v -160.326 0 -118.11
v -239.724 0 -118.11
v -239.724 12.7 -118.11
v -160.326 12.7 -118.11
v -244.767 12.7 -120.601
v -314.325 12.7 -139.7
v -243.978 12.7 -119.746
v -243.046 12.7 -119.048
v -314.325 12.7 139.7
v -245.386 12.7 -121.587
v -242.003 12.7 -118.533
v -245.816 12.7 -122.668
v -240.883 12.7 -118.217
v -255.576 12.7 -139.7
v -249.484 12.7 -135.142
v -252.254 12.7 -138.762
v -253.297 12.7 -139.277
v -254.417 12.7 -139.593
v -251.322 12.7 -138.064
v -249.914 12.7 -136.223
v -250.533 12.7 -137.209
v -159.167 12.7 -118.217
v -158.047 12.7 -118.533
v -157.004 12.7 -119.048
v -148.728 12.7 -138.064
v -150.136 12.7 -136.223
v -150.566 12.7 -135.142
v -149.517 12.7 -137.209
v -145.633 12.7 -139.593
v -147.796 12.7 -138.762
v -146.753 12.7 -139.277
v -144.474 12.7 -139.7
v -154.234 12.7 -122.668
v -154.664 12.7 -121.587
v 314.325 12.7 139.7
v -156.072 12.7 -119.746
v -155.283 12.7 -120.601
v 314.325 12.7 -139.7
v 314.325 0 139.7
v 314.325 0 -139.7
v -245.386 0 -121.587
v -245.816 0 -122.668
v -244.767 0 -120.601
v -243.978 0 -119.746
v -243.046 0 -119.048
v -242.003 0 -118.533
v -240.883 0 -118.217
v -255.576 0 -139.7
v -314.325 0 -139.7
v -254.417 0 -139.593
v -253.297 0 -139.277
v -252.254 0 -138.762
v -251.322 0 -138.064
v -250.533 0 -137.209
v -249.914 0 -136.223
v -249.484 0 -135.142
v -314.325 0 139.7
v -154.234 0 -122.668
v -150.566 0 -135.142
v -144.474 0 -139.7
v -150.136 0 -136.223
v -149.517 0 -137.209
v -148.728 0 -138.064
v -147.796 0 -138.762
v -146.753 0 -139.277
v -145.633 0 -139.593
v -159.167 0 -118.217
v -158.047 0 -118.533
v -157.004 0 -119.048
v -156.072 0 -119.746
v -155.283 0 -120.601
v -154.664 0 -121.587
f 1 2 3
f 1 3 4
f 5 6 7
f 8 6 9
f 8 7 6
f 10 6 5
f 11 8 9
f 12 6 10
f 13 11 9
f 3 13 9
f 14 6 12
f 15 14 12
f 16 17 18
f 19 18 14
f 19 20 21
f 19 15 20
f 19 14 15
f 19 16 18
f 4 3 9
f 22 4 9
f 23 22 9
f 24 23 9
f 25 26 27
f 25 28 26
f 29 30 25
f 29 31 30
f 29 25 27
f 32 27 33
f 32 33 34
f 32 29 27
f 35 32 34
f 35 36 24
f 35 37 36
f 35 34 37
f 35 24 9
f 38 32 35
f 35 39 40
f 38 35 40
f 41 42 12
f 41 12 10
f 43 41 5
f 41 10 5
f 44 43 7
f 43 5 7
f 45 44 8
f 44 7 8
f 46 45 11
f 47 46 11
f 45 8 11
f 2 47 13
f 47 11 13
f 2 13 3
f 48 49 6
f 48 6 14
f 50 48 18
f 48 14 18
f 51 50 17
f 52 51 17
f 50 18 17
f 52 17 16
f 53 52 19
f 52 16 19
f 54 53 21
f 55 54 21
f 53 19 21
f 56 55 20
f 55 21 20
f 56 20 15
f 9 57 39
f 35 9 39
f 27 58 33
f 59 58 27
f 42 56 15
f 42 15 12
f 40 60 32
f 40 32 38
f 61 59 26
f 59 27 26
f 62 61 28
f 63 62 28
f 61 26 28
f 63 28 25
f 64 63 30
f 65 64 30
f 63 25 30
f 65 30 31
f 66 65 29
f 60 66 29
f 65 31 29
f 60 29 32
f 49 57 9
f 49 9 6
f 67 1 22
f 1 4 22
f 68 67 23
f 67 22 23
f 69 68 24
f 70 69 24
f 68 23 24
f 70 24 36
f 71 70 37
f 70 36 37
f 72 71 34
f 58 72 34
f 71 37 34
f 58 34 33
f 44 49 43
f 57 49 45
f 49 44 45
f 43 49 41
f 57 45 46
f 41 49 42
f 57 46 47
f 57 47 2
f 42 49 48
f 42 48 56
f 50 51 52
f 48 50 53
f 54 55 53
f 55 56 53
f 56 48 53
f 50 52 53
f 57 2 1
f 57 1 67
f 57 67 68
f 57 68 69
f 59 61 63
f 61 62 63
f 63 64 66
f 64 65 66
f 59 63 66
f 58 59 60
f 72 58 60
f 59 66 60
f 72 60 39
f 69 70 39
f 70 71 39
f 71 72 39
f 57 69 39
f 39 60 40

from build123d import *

# Parameters (mm, degrees)
SKETCH1_W           = 628.65
SKETCH1_H           = 279.4
BOSS_EXTRUDE1_DEPTH = 12.7
CUT_EXTRUDE1_DEPTH  = 345.20573154
FILLET1_R           = 6.35


with BuildPart() as part:
    # Sketch1 → Boss-Extrude1 (new body)
    with BuildSketch(Plane(origin=(0, 0, 0), x_dir=(1, 0, 0), z_dir=(0, 1, 0))):
        Rectangle(SKETCH1_W, SKETCH1_H)
    extrude(amount=BOSS_EXTRUDE1_DEPTH)

    # Sketch2 → Cut-Extrude1 (cut, through all)
    with BuildSketch(Plane.XZ):
        Polygon((-149.225, -139.7), (-250.825, -139.7), (-244.475, -118.11), (-155.575, -118.11), align=None)
    extrude(amount=-CUT_EXTRUDE1_DEPTH, mode=Mode.SUBTRACT)

    # Fillet1
    fillet1_edges = [part.edges().sort_by_distance(p)[0] for p in [
        (-155.575, 6.35, -118.11),
        (-149.225, 6.35, -139.7),
        (-250.825, 6.35, -139.7),
        (-244.475, 6.35, -118.11),
    ]]
    fillet(fillet1_edges, radius=FILLET1_R)


solid = part.part
